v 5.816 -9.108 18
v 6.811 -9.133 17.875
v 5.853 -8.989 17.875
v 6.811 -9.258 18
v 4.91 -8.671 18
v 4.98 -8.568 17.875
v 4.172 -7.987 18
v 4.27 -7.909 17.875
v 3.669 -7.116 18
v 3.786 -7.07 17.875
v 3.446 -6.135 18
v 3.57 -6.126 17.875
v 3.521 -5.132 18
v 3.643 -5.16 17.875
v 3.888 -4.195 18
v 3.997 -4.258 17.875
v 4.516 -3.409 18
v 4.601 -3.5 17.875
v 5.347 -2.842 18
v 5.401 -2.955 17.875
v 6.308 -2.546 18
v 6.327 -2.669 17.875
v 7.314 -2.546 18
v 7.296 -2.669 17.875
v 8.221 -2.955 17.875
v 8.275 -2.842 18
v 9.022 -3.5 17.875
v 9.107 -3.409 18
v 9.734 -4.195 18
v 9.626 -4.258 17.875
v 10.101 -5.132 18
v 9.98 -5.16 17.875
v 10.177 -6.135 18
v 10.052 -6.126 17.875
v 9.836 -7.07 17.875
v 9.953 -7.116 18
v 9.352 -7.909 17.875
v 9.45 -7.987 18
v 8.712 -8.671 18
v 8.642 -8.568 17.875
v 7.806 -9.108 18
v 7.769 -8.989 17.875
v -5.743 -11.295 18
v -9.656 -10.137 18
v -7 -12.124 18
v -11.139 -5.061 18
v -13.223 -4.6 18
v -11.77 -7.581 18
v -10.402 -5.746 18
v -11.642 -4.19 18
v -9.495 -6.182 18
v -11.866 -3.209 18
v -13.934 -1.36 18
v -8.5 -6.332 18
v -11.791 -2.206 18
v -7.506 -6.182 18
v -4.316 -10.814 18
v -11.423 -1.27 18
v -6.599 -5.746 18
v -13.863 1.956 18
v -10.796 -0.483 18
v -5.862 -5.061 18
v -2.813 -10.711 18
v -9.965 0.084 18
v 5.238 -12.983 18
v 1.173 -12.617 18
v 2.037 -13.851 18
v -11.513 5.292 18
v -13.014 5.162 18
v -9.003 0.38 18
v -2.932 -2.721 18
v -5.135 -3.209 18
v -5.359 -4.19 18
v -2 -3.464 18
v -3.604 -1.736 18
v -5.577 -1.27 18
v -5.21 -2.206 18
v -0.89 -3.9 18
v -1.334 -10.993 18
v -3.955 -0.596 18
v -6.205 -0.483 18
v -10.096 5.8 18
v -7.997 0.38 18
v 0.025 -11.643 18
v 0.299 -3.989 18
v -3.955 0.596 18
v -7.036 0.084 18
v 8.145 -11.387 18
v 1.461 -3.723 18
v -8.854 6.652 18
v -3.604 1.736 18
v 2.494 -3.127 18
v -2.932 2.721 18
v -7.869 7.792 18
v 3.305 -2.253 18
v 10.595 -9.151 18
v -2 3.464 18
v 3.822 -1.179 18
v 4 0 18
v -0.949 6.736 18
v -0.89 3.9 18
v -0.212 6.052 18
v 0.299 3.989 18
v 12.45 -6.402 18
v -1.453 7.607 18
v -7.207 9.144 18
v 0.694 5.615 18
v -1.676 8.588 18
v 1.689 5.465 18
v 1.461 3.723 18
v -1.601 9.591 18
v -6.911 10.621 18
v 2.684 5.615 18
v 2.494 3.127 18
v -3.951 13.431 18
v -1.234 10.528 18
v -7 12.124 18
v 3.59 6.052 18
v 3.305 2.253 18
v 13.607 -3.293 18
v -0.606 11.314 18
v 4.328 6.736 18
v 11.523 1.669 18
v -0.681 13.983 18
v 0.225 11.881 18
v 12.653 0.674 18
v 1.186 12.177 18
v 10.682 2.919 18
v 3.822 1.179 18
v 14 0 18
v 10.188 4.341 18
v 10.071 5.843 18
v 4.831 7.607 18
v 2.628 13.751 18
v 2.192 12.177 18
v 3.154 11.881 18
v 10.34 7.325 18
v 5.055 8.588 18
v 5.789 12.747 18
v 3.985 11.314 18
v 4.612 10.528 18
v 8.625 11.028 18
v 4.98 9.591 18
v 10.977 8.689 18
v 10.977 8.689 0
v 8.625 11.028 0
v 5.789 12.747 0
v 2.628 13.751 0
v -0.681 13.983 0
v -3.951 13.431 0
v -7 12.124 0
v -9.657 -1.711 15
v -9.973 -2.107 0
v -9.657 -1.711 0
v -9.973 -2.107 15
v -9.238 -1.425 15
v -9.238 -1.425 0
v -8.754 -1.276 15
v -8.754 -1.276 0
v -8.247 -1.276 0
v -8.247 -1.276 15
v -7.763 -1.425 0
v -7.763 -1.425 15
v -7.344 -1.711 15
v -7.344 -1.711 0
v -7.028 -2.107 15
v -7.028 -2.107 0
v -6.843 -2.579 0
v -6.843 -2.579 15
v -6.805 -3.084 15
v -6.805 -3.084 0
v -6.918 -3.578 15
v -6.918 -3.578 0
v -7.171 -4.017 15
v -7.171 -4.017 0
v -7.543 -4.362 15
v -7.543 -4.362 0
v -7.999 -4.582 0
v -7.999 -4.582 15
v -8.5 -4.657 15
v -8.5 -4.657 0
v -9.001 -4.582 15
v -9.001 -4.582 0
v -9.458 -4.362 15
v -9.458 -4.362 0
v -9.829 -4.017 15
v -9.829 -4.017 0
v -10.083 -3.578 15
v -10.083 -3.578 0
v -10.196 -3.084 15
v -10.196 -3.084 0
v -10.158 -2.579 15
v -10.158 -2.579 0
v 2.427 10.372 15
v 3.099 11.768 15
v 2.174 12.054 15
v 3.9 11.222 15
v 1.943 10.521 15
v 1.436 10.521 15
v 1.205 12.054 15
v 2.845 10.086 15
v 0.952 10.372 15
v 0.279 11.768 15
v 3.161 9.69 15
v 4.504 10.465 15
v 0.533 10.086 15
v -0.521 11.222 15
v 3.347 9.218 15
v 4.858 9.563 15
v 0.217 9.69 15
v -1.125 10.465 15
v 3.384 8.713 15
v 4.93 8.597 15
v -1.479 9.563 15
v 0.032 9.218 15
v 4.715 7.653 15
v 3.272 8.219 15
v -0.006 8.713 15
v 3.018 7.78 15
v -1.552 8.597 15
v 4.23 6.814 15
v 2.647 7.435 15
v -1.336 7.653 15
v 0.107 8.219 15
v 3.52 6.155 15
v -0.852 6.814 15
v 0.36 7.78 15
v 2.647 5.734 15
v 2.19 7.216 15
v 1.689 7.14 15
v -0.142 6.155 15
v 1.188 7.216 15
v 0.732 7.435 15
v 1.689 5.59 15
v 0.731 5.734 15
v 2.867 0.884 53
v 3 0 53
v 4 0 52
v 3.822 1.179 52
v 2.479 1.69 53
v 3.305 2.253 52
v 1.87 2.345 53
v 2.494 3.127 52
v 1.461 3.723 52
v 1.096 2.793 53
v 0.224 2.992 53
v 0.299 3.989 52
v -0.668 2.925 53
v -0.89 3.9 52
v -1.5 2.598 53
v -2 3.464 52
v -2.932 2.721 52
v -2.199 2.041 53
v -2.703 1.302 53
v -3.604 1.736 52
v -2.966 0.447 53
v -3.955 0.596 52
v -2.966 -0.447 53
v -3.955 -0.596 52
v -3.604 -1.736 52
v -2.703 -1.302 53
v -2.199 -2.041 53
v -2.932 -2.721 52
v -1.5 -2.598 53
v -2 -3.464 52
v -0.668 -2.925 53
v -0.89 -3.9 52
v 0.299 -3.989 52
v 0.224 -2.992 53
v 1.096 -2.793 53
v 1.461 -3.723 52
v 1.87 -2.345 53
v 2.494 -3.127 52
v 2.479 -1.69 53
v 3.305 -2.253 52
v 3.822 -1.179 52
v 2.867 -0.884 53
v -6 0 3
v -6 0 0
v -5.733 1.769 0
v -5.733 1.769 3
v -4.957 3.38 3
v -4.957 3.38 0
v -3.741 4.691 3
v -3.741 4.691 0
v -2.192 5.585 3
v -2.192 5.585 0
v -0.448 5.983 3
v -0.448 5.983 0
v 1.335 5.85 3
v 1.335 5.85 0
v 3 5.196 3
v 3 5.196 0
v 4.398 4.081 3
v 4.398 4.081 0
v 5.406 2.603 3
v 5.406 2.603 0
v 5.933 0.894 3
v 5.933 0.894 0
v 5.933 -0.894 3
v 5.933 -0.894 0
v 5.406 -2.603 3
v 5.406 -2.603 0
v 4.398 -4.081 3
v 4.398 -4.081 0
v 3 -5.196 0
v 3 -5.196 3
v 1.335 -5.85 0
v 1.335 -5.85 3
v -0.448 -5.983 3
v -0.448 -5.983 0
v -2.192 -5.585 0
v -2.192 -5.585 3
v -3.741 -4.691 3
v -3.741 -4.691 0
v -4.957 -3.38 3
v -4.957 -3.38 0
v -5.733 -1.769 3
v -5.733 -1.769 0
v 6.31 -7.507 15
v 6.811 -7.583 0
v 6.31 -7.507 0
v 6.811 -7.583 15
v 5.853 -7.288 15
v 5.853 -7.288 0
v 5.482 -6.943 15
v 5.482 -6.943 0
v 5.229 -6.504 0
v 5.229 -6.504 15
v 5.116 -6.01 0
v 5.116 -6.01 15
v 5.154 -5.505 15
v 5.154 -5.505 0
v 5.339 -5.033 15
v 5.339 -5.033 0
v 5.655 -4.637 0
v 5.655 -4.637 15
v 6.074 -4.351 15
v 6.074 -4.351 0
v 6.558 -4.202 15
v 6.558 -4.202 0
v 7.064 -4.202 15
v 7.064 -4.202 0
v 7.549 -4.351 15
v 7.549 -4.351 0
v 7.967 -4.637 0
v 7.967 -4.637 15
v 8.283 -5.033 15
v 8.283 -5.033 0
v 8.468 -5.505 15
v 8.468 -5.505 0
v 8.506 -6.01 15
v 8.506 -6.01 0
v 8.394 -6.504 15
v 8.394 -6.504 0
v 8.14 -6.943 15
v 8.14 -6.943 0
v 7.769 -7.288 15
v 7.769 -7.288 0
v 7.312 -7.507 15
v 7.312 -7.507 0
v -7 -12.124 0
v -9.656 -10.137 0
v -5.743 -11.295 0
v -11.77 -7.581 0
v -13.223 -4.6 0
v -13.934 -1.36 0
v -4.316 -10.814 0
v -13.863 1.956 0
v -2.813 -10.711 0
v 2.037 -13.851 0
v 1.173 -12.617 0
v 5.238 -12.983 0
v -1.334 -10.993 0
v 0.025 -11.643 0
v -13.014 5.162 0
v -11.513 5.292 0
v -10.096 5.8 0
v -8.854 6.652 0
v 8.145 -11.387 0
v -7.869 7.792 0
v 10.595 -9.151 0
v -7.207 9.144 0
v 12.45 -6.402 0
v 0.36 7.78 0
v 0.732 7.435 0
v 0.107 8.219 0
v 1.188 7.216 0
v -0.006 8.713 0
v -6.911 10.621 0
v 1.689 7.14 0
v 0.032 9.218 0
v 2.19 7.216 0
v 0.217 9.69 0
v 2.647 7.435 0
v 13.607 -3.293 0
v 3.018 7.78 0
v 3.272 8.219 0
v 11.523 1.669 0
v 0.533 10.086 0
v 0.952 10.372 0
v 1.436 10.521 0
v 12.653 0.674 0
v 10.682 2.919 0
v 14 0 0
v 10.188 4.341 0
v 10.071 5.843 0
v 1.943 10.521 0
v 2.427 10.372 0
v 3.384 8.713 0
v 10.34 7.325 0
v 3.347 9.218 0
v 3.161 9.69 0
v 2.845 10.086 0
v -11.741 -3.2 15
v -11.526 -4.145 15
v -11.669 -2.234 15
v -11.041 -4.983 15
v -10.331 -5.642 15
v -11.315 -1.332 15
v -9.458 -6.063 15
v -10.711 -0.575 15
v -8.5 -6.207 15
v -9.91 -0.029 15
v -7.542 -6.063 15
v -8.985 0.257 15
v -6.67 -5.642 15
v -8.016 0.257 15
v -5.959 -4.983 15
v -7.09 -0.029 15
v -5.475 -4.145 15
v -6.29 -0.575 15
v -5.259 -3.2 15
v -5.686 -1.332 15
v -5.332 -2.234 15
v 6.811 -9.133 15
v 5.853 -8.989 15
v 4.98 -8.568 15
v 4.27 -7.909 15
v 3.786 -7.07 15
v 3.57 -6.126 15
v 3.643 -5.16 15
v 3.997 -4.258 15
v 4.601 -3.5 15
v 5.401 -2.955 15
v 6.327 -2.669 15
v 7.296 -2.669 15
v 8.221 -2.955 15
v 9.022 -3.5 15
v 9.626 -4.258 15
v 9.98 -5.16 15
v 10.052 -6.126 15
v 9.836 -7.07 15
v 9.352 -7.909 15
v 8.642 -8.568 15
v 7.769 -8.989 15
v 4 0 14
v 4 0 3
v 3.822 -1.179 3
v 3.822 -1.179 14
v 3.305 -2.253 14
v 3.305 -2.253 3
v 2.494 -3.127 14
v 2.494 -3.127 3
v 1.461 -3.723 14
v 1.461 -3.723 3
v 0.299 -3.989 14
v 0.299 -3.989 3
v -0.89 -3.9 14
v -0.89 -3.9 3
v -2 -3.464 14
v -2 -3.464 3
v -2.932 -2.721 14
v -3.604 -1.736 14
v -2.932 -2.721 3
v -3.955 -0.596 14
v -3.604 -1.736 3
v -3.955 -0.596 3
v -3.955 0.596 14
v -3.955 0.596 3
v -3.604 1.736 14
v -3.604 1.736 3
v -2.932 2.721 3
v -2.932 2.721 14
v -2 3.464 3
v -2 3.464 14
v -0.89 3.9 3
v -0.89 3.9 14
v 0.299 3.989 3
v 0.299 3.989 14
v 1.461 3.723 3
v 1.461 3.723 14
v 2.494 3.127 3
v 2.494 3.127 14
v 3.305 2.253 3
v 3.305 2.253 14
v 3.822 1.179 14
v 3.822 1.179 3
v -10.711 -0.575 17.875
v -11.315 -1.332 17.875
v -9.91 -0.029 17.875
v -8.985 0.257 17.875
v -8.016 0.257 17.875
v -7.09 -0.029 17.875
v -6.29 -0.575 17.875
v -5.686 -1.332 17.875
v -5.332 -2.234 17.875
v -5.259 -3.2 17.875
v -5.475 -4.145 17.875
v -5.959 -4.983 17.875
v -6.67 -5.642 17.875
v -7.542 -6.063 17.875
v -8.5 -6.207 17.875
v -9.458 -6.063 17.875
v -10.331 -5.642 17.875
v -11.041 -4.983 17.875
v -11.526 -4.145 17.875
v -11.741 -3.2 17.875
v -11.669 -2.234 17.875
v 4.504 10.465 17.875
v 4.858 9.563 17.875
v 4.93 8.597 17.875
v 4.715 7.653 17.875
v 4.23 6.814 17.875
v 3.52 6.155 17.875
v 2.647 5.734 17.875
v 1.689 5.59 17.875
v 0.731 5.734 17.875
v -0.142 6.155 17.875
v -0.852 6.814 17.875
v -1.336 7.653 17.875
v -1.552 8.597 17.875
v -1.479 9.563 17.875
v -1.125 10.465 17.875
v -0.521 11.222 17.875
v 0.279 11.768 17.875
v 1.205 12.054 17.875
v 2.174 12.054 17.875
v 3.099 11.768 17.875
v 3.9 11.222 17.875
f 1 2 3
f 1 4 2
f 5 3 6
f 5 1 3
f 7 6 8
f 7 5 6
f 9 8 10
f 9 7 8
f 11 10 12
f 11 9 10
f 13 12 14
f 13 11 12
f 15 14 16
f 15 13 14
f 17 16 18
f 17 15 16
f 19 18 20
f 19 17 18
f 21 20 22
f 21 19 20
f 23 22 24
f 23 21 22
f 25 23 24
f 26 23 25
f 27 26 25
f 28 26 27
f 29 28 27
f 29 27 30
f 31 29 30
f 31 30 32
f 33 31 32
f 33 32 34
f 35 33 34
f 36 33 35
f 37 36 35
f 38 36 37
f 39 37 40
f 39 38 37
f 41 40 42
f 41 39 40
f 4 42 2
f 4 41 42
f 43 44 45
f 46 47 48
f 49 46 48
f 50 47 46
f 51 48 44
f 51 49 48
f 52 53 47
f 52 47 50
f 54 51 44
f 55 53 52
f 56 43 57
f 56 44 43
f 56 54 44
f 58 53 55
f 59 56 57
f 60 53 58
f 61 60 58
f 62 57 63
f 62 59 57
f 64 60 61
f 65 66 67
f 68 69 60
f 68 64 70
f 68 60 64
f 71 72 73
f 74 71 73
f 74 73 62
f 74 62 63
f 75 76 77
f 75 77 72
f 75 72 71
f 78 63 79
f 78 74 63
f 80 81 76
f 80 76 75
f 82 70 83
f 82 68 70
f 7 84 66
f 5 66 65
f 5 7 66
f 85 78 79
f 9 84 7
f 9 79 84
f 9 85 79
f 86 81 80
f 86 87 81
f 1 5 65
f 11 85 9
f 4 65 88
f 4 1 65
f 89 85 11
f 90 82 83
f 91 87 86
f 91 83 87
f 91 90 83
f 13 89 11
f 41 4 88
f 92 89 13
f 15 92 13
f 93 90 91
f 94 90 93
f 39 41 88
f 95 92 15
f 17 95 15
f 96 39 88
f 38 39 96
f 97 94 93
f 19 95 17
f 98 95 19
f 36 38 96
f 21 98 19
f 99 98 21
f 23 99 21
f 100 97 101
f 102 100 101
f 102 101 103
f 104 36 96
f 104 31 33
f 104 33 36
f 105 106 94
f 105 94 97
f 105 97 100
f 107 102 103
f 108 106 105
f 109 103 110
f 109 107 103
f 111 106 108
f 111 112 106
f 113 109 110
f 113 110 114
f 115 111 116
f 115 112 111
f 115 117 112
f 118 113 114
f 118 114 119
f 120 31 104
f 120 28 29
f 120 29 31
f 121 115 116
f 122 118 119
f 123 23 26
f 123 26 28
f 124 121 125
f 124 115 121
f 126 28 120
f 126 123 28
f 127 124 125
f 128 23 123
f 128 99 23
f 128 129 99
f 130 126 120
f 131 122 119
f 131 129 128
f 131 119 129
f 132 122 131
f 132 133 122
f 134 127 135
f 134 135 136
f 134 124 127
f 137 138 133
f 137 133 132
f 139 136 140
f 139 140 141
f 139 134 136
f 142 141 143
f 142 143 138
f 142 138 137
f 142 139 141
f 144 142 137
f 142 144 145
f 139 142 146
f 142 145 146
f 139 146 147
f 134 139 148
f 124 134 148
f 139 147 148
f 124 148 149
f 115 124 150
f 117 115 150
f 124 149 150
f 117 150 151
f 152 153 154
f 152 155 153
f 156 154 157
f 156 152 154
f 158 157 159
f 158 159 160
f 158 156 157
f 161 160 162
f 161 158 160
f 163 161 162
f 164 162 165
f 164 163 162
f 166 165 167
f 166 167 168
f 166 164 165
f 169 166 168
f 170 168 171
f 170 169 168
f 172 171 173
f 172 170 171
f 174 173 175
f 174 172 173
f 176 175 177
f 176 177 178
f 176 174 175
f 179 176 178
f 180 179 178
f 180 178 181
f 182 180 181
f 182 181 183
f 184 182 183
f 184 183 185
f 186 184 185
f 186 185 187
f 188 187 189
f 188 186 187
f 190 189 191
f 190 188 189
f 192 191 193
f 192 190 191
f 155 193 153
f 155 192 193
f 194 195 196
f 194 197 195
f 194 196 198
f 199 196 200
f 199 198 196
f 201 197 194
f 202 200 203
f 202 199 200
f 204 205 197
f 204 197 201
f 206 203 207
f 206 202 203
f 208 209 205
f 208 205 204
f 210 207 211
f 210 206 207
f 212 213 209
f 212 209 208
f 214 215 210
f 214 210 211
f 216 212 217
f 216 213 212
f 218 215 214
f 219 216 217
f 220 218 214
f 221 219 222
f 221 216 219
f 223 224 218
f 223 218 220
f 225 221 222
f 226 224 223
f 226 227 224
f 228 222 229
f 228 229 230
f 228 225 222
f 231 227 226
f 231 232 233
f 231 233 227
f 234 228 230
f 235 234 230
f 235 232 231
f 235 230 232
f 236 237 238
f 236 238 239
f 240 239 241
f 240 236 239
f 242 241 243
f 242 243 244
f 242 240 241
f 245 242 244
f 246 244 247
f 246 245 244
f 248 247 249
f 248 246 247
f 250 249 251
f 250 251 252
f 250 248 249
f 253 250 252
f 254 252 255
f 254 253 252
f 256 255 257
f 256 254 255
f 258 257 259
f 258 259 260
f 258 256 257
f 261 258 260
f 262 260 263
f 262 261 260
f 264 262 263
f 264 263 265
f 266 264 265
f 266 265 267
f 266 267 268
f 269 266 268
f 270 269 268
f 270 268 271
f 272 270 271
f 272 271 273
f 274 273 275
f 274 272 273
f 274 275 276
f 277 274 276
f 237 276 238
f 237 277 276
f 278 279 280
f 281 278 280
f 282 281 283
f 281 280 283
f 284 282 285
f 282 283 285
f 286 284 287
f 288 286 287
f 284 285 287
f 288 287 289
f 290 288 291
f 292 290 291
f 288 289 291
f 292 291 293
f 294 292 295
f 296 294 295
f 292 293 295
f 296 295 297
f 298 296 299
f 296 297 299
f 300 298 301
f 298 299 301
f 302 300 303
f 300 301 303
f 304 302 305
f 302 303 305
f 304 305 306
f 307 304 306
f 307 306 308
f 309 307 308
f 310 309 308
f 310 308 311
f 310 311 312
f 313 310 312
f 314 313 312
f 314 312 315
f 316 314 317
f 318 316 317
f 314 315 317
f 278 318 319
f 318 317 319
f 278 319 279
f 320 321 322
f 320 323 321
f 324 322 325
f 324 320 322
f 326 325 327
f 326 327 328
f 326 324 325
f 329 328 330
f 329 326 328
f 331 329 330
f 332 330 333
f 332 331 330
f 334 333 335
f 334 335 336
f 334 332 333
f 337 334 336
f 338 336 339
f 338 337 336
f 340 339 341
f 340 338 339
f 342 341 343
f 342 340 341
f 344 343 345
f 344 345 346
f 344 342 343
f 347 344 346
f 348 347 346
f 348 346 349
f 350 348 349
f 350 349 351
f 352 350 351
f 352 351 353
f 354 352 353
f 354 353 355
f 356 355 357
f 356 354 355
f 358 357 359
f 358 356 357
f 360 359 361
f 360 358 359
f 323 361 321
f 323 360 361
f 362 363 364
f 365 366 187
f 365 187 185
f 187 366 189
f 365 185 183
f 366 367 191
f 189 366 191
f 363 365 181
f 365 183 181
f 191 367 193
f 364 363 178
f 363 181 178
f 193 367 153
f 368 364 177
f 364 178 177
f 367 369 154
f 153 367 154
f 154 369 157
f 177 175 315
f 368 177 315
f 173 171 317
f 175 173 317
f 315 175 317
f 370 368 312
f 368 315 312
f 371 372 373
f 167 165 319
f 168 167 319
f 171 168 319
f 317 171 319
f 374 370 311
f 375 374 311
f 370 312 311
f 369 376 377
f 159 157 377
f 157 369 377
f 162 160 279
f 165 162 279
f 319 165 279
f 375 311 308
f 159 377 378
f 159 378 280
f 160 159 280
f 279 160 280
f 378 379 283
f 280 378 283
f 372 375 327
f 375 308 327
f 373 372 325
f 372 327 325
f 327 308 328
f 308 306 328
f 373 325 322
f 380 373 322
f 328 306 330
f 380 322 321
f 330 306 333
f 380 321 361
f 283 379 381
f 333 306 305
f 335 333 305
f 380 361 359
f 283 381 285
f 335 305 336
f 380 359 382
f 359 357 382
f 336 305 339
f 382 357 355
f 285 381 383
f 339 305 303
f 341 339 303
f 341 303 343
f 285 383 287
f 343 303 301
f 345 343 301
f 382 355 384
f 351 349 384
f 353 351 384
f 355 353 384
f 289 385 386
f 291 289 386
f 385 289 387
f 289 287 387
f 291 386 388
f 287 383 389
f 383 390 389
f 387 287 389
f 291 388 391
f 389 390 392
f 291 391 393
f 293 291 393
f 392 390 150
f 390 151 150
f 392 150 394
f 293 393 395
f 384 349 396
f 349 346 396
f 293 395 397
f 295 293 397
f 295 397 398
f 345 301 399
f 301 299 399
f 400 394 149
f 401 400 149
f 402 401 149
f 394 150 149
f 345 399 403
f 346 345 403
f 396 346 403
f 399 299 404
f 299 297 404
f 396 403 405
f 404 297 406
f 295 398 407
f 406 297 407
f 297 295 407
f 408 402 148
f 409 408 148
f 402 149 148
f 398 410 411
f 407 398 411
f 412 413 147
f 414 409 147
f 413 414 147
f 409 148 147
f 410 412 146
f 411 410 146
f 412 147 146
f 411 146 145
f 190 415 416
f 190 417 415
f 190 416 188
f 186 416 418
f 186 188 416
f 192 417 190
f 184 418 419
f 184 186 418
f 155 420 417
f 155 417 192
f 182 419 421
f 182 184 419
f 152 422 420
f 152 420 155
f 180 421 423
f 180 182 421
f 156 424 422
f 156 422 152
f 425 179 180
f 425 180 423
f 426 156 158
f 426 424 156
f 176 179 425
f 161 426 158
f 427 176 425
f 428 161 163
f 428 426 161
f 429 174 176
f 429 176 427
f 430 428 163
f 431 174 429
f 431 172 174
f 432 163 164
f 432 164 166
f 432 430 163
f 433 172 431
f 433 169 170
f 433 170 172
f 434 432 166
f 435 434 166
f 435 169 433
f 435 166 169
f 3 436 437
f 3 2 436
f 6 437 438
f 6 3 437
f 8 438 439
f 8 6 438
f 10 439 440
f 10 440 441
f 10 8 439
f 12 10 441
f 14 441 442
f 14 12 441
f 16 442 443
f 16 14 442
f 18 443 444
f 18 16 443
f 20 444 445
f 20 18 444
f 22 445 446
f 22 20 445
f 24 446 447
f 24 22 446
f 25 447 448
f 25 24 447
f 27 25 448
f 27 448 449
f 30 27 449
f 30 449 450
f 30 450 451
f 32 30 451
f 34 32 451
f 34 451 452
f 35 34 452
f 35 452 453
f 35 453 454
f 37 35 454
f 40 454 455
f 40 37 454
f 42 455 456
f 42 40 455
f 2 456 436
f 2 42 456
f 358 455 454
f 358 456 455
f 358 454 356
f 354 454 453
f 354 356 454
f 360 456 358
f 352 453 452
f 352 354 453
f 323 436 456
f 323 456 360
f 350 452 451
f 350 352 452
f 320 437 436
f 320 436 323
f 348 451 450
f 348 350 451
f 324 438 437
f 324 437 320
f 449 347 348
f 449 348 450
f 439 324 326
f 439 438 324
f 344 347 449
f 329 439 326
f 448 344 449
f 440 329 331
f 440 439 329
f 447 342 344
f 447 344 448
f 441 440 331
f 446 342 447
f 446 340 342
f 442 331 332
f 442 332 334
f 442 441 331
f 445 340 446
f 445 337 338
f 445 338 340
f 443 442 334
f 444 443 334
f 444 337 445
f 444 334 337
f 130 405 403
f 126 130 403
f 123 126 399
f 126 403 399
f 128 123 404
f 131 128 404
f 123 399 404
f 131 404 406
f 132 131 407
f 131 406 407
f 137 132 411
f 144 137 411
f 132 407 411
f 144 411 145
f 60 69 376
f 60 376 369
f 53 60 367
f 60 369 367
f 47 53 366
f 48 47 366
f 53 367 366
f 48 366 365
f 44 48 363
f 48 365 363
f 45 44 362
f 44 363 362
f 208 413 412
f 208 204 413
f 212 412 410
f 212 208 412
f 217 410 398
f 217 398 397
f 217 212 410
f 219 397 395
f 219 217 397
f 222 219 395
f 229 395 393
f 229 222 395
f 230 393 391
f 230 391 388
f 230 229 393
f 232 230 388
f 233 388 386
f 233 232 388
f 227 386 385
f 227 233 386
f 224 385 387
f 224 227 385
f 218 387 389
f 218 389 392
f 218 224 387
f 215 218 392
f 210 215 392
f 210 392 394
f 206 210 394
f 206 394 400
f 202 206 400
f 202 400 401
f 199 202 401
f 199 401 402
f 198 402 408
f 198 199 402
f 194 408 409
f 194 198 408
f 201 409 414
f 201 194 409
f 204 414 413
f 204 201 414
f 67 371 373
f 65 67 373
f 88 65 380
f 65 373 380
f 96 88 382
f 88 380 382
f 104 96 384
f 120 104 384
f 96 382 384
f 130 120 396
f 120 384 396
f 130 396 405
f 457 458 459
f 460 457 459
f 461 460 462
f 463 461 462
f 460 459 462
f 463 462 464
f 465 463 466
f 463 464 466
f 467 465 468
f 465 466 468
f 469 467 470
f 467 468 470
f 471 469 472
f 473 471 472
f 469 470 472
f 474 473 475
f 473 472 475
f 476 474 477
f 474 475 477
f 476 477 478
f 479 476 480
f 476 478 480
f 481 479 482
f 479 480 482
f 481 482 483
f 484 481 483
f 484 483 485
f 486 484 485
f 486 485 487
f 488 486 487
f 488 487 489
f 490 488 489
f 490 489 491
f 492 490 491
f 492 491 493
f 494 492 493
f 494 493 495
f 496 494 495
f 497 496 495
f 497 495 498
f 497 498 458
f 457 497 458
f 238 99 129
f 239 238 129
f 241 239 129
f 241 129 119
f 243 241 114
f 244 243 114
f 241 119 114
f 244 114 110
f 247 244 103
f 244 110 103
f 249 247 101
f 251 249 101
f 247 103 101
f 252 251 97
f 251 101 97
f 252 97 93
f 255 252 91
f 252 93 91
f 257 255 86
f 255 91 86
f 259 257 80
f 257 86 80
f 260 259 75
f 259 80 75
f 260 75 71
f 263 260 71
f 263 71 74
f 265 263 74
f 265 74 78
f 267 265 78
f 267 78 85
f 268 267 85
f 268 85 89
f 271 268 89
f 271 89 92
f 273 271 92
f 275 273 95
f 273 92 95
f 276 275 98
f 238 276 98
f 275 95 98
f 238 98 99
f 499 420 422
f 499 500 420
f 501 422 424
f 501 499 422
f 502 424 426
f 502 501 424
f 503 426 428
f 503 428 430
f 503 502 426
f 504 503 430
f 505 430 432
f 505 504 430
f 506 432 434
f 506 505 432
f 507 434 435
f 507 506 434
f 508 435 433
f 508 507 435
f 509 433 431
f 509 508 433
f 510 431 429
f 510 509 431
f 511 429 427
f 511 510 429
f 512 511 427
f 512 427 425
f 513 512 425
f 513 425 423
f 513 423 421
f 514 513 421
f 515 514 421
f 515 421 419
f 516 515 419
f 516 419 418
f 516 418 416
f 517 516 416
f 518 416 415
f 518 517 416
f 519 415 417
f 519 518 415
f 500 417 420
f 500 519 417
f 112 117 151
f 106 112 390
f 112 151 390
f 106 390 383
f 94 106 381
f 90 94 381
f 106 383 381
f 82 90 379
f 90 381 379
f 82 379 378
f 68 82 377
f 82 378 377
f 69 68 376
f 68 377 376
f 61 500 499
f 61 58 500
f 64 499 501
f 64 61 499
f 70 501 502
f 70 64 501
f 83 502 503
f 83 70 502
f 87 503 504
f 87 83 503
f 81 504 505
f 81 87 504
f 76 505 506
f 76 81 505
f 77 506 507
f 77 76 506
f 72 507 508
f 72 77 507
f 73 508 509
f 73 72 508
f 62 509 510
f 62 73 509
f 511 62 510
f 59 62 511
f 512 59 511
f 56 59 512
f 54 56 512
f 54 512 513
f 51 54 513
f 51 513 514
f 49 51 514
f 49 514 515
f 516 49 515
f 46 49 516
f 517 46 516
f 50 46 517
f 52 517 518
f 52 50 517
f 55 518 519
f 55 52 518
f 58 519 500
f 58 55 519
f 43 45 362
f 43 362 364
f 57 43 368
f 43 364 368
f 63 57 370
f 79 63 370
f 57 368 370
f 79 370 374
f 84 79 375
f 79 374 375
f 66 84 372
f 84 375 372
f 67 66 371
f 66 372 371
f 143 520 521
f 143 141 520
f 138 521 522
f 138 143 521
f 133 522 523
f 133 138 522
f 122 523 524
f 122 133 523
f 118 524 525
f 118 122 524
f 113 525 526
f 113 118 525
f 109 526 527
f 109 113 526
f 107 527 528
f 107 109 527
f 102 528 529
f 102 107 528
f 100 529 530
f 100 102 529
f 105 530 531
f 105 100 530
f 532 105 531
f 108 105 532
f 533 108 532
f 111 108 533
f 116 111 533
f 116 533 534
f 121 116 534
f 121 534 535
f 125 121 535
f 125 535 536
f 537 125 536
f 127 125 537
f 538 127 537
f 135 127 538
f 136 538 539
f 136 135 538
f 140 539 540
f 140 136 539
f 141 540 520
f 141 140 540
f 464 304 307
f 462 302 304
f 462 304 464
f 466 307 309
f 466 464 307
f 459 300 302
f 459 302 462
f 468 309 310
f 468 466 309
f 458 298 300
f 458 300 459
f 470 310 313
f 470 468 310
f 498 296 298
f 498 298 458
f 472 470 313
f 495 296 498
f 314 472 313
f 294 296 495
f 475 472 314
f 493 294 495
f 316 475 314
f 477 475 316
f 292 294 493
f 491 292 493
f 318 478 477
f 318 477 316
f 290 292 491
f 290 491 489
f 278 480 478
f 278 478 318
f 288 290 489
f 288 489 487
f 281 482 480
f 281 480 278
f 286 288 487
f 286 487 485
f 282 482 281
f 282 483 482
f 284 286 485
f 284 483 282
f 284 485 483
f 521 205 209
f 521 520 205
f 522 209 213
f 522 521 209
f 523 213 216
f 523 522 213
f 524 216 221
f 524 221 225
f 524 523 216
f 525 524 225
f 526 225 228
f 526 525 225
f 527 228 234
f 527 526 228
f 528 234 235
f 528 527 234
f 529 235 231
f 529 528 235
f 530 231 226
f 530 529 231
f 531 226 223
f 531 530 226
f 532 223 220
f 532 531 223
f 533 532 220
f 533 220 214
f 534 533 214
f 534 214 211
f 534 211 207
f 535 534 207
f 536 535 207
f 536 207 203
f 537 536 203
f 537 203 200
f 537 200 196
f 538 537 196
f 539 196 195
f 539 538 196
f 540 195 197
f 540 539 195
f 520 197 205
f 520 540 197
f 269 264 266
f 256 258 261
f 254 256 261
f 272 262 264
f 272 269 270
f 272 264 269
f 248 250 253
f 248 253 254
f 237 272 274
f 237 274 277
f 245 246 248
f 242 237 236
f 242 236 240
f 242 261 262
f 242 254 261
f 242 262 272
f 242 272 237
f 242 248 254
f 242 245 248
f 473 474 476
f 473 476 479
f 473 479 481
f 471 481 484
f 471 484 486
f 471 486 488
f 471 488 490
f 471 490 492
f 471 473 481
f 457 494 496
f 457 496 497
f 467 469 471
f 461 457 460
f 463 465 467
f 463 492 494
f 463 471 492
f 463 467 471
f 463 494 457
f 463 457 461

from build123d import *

# Parameters (mm, degrees)
RESSALTO_EXTRUS_O1_DEPTH = 18
ESBO_O2_R                = 4
RESSALTO_EXTRUS_O2_DEPTH = 35
CHANFRO1_SIZE            = 1
PADR_OCIRCULAR1_COUNT    = 3
ESBO_O6_R                = 6
CORTE_EXTRUS_O1_DEPTH    = 3
ESBO_O6_4_R              = 4
CORTE_EXTRUS_O2_DEPTH    = 14


with BuildPart() as part:
    # Esboço1 → Ressalto-extrusão1 (new body)
    with BuildSketch(Plane.XY):
        with BuildLine():
            ThreePointArc((10.389270368, 3.614285714), (10.102290249, 6.219039436), (10.977142857, 8.689207944))
            ThreePointArc((10.977142857, 8.689207944), (2.627637013, 13.75120081), (-7, 12.124355653))
            ThreePointArc((-7, 12.124355653), (-8.324698429, 7.190229208), (-13.013646247, 5.161880603))
            ThreePointArc((-13.013646247, 5.161880603), (-13.222707741, -4.6), (-7, -12.124355653))
            ThreePointArc((-7, -12.124355653), (-2.064571939, -10.804514922), (2.03650339, -13.851088547))
            ThreePointArc((2.03650339, -13.851088547), (10.595070728, -9.15120081), (14, 0))
            ThreePointArc((14, 0), (11.780915009, 1.39382974), (10.389270368, 3.614285714))
        make_face()
    extrude(amount=RESSALTO_EXTRUS_O1_DEPTH)

    # Esboço2 → Ressalto-extrusão2 (add)
    with BuildSketch(Plane.XY.offset(18)):
        Circle(ESBO_O2_R)
    extrude(amount=RESSALTO_EXTRUS_O2_DEPTH)

    # Chanfro1
    chanfro1_edges = [part.edges().sort_by_distance(p)[0] for p in [
        (-4, 0, 53),
    ]]
    chamfer(chanfro1_edges, length=CHANFRO1_SIZE)

    # Esboço5 → Rebaixo para SHCS M31 (revolve, cut)
    with BuildSketch(Plane(origin=(6.811116896, -5.882914807, 18), x_dir=(0, -1, 0), z_dir=(1, 0, 0))):
        Polygon((0, 0), (0, 18), (1.7, 18), (1.7, 3), (3.25, 3), (3.25, 0.125), (3.375, 0), align=None)
    rebaixo_para_shcs_m31 = revolve(axis=Axis((6.811116896, -5.882914807, 24.35), (0, 0, -1)), mode=Mode.SUBTRACT)

    # PadrãoCircular1: Rebaixo para SHCS M31 ×3 about axis
    padr_ocircular1_axis = Axis((0, 0, 18), (0, 0, 1))
    for i in range(1, PADR_OCIRCULAR1_COUNT):
        add(rebaixo_para_shcs_m31.rotate(padr_ocircular1_axis, i * 360 / PADR_OCIRCULAR1_COUNT), mode=Mode.SUBTRACT)

    # Esboço6 → Corte-extrusão1 (cut)
    with BuildSketch(Plane(origin=(0, 0, 0), x_dir=(-1, 0, 0), z_dir=(0, 0, -1))):
        Circle(ESBO_O6_R)
    extrude(amount=-CORTE_EXTRUS_O1_DEPTH, mode=Mode.SUBTRACT)

    # Esboço6<4> → Corte-extrusão2 (cut)
    with BuildSketch(Plane(origin=(0, 0, 0), x_dir=(-1, 0, 0), z_dir=(0, 0, -1))):
        Circle(ESBO_O6_4_R)
    extrude(amount=-CORTE_EXTRUS_O2_DEPTH, mode=Mode.SUBTRACT)


solid = part.part
